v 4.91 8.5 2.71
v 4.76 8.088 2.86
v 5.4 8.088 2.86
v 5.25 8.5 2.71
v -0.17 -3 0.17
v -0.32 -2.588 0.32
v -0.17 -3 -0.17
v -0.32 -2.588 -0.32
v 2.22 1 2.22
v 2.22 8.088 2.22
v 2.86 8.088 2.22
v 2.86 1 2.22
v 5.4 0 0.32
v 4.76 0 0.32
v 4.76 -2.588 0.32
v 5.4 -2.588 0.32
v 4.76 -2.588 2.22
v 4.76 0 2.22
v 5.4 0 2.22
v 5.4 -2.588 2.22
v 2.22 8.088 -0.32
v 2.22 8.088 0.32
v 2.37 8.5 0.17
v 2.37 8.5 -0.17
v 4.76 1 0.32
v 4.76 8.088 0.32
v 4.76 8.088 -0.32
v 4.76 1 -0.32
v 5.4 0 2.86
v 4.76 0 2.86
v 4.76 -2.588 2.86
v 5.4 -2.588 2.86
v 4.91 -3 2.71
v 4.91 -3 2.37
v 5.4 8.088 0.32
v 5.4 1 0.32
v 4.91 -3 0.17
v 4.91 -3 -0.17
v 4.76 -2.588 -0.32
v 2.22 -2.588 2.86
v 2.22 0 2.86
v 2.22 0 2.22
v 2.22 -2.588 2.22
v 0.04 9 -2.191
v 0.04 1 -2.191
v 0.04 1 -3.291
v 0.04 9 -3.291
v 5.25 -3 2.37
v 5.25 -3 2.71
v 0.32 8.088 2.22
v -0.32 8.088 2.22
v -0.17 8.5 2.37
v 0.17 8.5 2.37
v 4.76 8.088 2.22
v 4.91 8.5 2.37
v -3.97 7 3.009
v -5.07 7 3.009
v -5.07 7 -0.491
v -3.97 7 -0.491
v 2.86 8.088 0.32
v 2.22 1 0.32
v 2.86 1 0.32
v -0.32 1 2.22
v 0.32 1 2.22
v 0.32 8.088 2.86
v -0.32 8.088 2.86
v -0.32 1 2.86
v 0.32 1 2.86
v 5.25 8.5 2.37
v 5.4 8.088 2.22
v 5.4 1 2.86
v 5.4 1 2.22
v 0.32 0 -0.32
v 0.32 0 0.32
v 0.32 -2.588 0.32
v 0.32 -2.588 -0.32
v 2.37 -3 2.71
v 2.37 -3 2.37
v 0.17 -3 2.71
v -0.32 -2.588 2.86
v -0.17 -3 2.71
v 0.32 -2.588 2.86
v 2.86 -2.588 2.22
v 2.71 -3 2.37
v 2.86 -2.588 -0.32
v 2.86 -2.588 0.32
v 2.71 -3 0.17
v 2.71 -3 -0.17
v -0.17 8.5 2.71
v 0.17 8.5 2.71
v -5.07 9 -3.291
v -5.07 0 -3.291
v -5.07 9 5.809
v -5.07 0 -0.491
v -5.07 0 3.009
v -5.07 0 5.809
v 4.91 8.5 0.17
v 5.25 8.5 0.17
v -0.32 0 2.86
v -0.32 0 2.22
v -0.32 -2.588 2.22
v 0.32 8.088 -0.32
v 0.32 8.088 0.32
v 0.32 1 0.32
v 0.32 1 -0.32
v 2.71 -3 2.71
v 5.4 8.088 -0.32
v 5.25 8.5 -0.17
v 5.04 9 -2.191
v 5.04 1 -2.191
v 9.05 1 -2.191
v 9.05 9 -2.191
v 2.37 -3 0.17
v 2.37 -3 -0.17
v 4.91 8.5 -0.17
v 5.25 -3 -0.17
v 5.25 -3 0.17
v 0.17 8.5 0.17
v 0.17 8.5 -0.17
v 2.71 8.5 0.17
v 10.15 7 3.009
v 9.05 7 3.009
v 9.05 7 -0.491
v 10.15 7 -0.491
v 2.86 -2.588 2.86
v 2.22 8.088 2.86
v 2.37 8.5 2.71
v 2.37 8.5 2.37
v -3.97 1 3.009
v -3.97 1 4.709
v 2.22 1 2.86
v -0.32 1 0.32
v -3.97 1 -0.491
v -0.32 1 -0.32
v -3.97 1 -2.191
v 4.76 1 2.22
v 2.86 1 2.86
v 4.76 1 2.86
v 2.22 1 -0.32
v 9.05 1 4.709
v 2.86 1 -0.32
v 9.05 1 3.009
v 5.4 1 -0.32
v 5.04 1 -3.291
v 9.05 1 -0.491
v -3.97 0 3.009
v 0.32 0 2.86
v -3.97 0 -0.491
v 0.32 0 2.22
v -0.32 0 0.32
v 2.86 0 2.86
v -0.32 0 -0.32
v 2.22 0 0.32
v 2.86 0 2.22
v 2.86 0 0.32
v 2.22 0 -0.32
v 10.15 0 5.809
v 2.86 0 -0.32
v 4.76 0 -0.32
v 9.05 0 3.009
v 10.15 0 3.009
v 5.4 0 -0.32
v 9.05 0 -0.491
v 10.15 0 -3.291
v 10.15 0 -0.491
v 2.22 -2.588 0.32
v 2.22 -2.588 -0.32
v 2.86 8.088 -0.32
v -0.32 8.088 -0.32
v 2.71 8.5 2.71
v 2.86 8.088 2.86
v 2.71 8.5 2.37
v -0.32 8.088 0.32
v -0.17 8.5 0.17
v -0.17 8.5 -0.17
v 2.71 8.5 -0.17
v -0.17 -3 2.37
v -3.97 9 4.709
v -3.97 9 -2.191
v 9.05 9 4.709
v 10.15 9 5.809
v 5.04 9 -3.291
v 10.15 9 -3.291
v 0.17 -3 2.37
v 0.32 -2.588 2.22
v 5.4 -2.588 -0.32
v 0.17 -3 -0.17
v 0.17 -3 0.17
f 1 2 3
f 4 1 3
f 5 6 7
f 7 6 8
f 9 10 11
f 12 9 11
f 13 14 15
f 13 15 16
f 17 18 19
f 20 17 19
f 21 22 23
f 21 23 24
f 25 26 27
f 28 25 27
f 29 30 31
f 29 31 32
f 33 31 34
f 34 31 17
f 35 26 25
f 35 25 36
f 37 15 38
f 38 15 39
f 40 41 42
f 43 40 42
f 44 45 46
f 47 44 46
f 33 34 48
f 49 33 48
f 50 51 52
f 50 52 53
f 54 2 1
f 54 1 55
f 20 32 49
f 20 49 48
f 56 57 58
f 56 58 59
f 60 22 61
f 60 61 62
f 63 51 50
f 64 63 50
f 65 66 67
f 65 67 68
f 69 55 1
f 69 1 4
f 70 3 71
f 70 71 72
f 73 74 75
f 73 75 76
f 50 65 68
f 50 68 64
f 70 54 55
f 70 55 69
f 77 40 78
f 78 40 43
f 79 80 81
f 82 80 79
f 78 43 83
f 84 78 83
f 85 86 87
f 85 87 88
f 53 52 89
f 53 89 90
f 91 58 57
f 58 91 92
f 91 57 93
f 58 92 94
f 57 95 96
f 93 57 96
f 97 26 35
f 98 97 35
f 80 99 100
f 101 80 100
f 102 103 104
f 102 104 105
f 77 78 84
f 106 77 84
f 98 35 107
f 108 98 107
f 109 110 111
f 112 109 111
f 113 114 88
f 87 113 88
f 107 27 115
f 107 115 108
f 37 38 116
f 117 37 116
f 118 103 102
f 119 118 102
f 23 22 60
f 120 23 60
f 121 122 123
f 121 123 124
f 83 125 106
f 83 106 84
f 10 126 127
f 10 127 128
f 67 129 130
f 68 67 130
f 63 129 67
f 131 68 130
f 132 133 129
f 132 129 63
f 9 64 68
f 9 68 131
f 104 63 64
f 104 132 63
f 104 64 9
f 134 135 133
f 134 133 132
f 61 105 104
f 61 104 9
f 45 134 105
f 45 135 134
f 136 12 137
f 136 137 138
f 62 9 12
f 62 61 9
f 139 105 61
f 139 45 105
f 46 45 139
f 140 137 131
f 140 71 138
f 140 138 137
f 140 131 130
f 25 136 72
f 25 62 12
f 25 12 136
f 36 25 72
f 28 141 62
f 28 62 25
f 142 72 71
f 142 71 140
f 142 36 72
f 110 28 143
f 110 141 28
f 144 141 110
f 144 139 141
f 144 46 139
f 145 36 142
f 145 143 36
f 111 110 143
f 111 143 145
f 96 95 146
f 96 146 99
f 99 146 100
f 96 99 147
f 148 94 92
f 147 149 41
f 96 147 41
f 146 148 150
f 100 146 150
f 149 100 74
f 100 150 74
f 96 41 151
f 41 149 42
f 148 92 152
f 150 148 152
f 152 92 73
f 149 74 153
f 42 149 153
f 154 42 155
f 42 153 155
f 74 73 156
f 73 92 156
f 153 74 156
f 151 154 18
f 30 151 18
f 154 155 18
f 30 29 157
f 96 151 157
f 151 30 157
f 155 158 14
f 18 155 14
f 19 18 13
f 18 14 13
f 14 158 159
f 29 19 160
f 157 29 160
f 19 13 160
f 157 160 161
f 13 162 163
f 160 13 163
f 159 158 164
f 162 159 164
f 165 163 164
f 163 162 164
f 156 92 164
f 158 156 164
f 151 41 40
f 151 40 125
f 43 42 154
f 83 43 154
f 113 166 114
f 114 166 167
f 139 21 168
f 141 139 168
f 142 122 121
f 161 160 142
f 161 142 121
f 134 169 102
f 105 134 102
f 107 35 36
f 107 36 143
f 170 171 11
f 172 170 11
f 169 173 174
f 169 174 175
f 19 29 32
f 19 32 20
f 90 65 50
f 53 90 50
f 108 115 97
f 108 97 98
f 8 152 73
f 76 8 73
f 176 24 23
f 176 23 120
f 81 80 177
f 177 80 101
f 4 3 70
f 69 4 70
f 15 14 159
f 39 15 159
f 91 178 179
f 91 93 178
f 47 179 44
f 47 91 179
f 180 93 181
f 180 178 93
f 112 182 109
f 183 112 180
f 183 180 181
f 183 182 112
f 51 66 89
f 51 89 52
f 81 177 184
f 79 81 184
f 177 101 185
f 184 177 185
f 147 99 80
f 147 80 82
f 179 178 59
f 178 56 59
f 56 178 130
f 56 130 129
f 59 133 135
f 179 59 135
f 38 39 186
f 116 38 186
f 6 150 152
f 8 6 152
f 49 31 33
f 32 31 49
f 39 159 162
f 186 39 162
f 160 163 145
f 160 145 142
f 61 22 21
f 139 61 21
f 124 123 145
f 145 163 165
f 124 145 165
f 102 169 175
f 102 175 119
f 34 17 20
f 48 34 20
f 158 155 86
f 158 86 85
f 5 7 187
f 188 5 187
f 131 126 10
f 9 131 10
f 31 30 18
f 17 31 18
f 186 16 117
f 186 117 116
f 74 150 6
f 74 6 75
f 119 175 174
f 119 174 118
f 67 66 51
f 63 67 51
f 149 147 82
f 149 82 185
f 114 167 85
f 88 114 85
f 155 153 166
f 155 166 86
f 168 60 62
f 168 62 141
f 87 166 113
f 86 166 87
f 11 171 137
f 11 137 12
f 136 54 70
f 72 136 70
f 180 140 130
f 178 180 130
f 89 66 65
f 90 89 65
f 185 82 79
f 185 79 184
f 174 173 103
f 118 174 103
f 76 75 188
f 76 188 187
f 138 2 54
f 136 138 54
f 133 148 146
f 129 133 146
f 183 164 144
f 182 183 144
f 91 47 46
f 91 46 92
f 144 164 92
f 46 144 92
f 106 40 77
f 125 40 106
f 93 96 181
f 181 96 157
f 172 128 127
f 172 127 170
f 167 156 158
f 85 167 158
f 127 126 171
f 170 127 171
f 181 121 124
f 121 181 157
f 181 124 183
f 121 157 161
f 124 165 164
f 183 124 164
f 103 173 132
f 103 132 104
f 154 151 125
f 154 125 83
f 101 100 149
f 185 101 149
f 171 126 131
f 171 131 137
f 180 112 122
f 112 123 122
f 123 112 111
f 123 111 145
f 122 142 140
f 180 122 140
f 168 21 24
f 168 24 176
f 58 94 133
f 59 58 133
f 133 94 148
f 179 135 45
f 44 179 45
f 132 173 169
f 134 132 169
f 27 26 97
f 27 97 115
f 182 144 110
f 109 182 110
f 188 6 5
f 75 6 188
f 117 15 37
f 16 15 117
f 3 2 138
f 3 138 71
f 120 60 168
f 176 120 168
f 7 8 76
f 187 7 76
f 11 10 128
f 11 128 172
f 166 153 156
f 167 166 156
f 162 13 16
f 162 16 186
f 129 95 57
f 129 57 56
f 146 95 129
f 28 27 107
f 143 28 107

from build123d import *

# Parameters (mm, degrees)
SKETCH_1_W               = 0.64
SKETCH_1_H               = 0.64
EXTRUDE_1_DEPTH          = 8.5
EXTRUDE_1_DEPTH_BACK     = 3
CHAMFER_1_SIZE           = 0.15
CHAMFER_1_SIZE2          = 0.412121613
CHAMFER_1_PART_2_SIZE    = 0.15
CHAMFER_1_PART_2_SIZE2   = 0.412121613
PATTERN_LINEAR_1_COUNT   = 3
PATTERN_LINEAR_1_PITCH   = 2.54
PATTERN_LINEAR_1_2_COUNT = 2
PATTERN_LINEAR_1_2_PITCH = 2.54
SKETCH_2_W               = 13.02
SKETCH_2_H               = 6.9
SKETCH_2_W_2             = 0.64
SKETCH_2_H_2             = 0.64
SKETCH_2_W_3             = 5
SKETCH_2_H_3             = 1.1
EXTRUDE_2_DEPTH          = 1
EXTRUDE_3_DEPTH          = 9
SKETCH_3_W               = 1.1
SKETCH_3_H               = 3.5
CUT_EXTRUDE_2_DEPTH      = 7


with BuildPart() as part:
    # Эскиз1 → Бобышка-Вытянуть1 (new body, two sides)
    with BuildSketch(Plane(origin=(0, 0, 0), x_dir=(1, 0, 0), z_dir=(0, 1, 0))) as extrude_1_sk:
        Rectangle(SKETCH_1_W, SKETCH_1_H)
    extrude(amount=EXTRUDE_1_DEPTH)
    extrude(extrude_1_sk.sketch, amount=-EXTRUDE_1_DEPTH_BACK)

    # Фаска1
    chamfer_1_edges = [part.edges().sort_by_distance(p)[0] for p in [
        (0.32, -3, 0),
        (0, -3, 0.32),
        (-0.32, -3, 0),
        (0, -3, -0.32),
    ]]
    chamfer_1_side = [part.faces().sort_by_distance(p)[0] for p in [
        (0, -3, 0),
    ]]
    chamfer(chamfer_1_edges, length=CHAMFER_1_SIZE, length2=CHAMFER_1_SIZE2, reference=chamfer_1_side[0])

    # Фаска1 part 2
    chamfer_1_part_2_edges = [part.edges().sort_by_distance(p)[0] for p in [
        (-0.32, 8.5, 0),
        (0, 8.5, -0.32),
        (0, 8.5, 0.32),
        (0.32, 8.5, 0),
    ]]
    chamfer_1_part_2_side = [part.faces().sort_by_distance(p)[0] for p in [
        (0, 8.5, 0),
    ]]
    chamfer(chamfer_1_part_2_edges, length=CHAMFER_1_PART_2_SIZE, length2=CHAMFER_1_PART_2_SIZE2, reference=chamfer_1_part_2_side[0])


with BuildPart() as pattern_linear_1_1:
    # Линейный массив1: pattern copy
    add(part.part.moved(Location(Vector(1, 0, 0) * (1 * PATTERN_LINEAR_1_PITCH))))


with BuildPart() as pattern_linear_1_2:
    # Линейный массив1: pattern copy
    add(part.part.moved(Location(Vector(1, 0, 0) * (2 * PATTERN_LINEAR_1_PITCH))))


with BuildPart() as pattern_linear_1_2_1:
    # Pattern Linear 1 2: pattern copy
    add(part.part.moved(Location(Vector(0, 0, 1) * (1 * PATTERN_LINEAR_1_2_PITCH))))


with BuildPart() as pattern_linear_1_2_2:
    # Pattern Linear 1 2: pattern copy
    add(pattern_linear_1_1.part.moved(Location(Vector(0, 0, 1) * (1 * PATTERN_LINEAR_1_2_PITCH))))


with BuildPart() as pattern_linear_1_2_3:
    # Pattern Linear 1 2: pattern copy
    add(pattern_linear_1_2.part.moved(Location(Vector(0, 0, 1) * (1 * PATTERN_LINEAR_1_2_PITCH))))


with BuildPart() as part_1:
    add(part.part)

    add(pattern_linear_1_1.part)  # Бобышка-Вытянуть2 merges Линейный массив1_1

    add(pattern_linear_1_2.part)  # Бобышка-Вытянуть2 merges Линейный массив1_2

    add(pattern_linear_1_2_1.part)  # Бобышка-Вытянуть2 merges Линейный массив1 2_1

    add(pattern_linear_1_2_2.part)  # Бобышка-Вытянуть2 merges Линейный массив1 2_2

    add(pattern_linear_1_2_3.part)  # Бобышка-Вытянуть2 merges Линейный массив1 2_3
    # Эскиз2 → Бобышка-Вытянуть2 (add)
    with BuildSketch(Plane(origin=(0, 0, 0), x_dir=(1, 0, 0), z_dir=(0, 1, 0))):
        with Locations((2.54, -1.259333449)):
            Rectangle(SKETCH_2_W, SKETCH_2_H)
        with Locations((0, -2.54)):
            Rectangle(SKETCH_2_W_2, SKETCH_2_H_2, mode=Mode.SUBTRACT)
        with Locations((5.08, -2.54)):
            Rectangle(SKETCH_2_W_2, SKETCH_2_H_2, mode=Mode.SUBTRACT)
        with Locations((2.54, -2.54)):
            Rectangle(SKETCH_2_W_2, SKETCH_2_H_2, mode=Mode.SUBTRACT)
        with Locations((5.08, 0)):
            Rectangle(SKETCH_2_W_2, SKETCH_2_H_2, mode=Mode.SUBTRACT)
        with Locations((2.54, 0)):
            Rectangle(SKETCH_2_W_2, SKETCH_2_H_2, mode=Mode.SUBTRACT)
        Rectangle(SKETCH_2_W_2, SKETCH_2_H_2, mode=Mode.SUBTRACT)
        with Locations((2.54, 2.740666551)):
            Rectangle(SKETCH_2_W_3, SKETCH_2_H_3)
    extrude(amount=EXTRUDE_2_DEPTH)

    # Эскиз2<3> → Бобышка-Вытянуть3 (add)
    with BuildSketch(Plane(origin=(0, 0, 0), x_dir=(1, 0, 0), z_dir=(0, 1, 0))):
        Polygon((-5.07, 3.290666551), (-5.07, -5.809333449), (10.15, -5.809333449), (10.15, 3.290666551), (5.04, 3.290666551), (5.04, 2.190666551), (9.05, 2.190666551), (9.05, -4.709333449), (-3.97, -4.709333449), (-3.97, 2.190666551), (0.04, 2.190666551), (0.04, 3.290666551), align=None)
    extrude(amount=EXTRUDE_3_DEPTH)

    # Эскиз3 → Вырез-Вытянуть2 (cut)
    with BuildSketch(Plane.XZ):
        with Locations((-4.52, 1.259333449)):
            Rectangle(SKETCH_3_W, SKETCH_3_H)
        with Locations((9.6, 1.259333449)):
            Rectangle(SKETCH_3_W, SKETCH_3_H)
    extrude(amount=-CUT_EXTRUDE_2_DEPTH, mode=Mode.SUBTRACT)


solid = part_1.part
